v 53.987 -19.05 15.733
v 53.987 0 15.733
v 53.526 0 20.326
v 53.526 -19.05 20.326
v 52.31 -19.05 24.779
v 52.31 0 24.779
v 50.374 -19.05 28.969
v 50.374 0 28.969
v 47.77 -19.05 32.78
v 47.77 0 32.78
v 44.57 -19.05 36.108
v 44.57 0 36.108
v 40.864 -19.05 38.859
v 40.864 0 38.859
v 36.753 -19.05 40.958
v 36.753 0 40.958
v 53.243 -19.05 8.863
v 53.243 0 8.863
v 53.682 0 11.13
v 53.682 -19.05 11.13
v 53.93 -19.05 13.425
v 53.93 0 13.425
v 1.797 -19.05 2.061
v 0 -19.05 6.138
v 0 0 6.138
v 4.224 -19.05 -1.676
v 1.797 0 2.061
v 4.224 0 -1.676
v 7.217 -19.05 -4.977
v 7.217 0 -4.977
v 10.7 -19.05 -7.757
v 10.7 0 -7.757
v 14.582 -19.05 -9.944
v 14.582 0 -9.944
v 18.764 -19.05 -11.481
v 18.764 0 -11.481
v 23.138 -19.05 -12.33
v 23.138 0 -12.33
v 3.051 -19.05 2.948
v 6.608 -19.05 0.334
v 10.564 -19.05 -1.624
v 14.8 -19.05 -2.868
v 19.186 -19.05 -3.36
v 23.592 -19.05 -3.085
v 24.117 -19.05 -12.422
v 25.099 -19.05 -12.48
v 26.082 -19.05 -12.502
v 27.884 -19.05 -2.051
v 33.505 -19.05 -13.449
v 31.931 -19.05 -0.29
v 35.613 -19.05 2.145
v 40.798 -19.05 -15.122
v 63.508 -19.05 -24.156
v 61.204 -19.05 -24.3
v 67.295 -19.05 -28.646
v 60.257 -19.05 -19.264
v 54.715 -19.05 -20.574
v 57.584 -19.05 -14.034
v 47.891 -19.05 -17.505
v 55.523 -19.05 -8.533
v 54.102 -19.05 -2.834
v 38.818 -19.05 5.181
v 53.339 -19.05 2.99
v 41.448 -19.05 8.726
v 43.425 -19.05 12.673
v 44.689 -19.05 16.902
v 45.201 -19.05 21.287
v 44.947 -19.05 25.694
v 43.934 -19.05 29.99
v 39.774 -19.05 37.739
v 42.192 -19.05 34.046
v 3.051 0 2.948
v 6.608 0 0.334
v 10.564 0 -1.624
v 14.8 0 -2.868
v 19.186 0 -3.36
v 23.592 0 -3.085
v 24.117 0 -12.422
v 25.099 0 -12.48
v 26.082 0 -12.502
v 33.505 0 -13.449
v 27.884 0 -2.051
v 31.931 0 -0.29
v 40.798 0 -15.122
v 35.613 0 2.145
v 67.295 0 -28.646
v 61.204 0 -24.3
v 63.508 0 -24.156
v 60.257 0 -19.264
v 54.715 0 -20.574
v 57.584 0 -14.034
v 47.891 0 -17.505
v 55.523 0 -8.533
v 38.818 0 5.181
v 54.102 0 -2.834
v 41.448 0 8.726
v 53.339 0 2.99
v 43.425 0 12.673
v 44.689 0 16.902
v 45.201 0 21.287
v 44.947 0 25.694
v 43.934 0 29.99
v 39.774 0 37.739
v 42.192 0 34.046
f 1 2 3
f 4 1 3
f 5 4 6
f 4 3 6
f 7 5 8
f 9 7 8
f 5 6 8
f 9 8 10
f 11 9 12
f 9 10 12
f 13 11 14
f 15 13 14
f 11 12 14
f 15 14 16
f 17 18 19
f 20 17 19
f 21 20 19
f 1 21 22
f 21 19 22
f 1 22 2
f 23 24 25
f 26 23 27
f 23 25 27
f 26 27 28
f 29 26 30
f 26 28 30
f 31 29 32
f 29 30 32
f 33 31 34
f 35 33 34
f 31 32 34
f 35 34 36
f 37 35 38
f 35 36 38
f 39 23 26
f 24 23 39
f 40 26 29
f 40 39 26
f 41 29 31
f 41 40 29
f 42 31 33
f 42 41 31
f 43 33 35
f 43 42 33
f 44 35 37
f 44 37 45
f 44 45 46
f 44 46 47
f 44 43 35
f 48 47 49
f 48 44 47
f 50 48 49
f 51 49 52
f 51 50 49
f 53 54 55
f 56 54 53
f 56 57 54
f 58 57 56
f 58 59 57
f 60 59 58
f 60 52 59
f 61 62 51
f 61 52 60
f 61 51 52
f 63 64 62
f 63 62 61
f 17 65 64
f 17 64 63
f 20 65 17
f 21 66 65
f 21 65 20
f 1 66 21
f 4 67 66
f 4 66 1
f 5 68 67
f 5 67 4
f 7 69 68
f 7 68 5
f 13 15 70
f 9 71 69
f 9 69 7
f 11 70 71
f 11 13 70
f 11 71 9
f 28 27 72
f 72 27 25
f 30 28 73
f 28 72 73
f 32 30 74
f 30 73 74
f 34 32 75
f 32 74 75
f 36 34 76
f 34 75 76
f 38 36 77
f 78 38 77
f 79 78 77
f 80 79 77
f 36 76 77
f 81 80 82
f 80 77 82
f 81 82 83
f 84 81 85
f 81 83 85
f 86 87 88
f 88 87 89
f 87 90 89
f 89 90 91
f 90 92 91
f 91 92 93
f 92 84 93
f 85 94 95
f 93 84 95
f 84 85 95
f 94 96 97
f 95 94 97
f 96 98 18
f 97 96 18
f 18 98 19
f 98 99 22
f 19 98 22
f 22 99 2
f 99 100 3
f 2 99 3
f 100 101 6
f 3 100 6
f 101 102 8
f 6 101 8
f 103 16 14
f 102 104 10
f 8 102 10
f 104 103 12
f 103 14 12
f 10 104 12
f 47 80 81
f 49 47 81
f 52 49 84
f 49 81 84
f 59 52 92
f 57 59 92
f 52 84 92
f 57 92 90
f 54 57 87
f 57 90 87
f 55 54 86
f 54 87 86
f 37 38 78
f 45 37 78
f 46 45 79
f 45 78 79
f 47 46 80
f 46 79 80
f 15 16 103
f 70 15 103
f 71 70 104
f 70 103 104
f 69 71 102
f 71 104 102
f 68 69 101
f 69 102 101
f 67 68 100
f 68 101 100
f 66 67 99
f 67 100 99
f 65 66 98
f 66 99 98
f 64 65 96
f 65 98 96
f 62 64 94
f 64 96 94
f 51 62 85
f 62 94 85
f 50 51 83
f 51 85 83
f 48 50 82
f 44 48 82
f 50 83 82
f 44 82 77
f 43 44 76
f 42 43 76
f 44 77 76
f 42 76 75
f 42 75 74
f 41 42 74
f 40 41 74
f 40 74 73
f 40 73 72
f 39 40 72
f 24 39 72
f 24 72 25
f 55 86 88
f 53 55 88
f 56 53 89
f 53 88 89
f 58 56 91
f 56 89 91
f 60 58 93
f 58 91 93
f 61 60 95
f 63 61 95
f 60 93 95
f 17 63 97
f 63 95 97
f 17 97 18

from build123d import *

# Parameters (mm, degrees)
F1_DEPTH = 19.05


with BuildPart() as f1:
    # F0 (on Front) → F1 (new body)
    with BuildSketch(Plane.XZ):
        with BuildLine():
            ThreePointArc((36.753029, 40.957993), (37.281433, 3.593556), (0, 6.138184))
            ThreePointArc((0, 6.138184), (8.90252, -6.437058), (23.138397, -12.330394))
            ThreePointArc((23.138397, -12.330394), (24.611231, -12.401927), (26.082398, -12.502042))
            ThreePointArc((26.082398, -12.502042), (43.391463, -6.559586), (53.243299, 8.863053))
            ThreePointArc((53.243299, 8.863053), (53.500008, 12.310691), (53.987336, 15.733354))
            ThreePointArc((53.987336, 15.733354), (49.151042, 30.928882), (36.753029, 40.957993))
        make_face()
        with BuildLine():
            ThreePointArc((26.082398, -12.502042), (24.611231, -12.401927), (23.138397, -12.330394))
            ThreePointArc((23.138397, -12.330394), (24.608117, -12.455329), (26.082398, -12.502042))
        make_face()
        with BuildLine():
            ThreePointArc((53.243299, 8.863053), (53.829881, 12.274967), (53.987336, 15.733354))
            ThreePointArc((53.987336, 15.733354), (53.500008, 12.310691), (53.243299, 8.863053))
        make_face()
        with BuildLine():
            ThreePointArc((53.243299, 8.863053), (43.391463, -6.559586), (26.082398, -12.502042))
            ThreePointArc((26.082398, -12.502042), (47.890891, -17.50496), (67.295052, -28.645788))
            ThreePointArc((67.295052, -28.645788), (56.475186, -11.312691), (53.243299, 8.863053))
        make_face()
    extrude(amount=F1_DEPTH)


solid = f1.part
